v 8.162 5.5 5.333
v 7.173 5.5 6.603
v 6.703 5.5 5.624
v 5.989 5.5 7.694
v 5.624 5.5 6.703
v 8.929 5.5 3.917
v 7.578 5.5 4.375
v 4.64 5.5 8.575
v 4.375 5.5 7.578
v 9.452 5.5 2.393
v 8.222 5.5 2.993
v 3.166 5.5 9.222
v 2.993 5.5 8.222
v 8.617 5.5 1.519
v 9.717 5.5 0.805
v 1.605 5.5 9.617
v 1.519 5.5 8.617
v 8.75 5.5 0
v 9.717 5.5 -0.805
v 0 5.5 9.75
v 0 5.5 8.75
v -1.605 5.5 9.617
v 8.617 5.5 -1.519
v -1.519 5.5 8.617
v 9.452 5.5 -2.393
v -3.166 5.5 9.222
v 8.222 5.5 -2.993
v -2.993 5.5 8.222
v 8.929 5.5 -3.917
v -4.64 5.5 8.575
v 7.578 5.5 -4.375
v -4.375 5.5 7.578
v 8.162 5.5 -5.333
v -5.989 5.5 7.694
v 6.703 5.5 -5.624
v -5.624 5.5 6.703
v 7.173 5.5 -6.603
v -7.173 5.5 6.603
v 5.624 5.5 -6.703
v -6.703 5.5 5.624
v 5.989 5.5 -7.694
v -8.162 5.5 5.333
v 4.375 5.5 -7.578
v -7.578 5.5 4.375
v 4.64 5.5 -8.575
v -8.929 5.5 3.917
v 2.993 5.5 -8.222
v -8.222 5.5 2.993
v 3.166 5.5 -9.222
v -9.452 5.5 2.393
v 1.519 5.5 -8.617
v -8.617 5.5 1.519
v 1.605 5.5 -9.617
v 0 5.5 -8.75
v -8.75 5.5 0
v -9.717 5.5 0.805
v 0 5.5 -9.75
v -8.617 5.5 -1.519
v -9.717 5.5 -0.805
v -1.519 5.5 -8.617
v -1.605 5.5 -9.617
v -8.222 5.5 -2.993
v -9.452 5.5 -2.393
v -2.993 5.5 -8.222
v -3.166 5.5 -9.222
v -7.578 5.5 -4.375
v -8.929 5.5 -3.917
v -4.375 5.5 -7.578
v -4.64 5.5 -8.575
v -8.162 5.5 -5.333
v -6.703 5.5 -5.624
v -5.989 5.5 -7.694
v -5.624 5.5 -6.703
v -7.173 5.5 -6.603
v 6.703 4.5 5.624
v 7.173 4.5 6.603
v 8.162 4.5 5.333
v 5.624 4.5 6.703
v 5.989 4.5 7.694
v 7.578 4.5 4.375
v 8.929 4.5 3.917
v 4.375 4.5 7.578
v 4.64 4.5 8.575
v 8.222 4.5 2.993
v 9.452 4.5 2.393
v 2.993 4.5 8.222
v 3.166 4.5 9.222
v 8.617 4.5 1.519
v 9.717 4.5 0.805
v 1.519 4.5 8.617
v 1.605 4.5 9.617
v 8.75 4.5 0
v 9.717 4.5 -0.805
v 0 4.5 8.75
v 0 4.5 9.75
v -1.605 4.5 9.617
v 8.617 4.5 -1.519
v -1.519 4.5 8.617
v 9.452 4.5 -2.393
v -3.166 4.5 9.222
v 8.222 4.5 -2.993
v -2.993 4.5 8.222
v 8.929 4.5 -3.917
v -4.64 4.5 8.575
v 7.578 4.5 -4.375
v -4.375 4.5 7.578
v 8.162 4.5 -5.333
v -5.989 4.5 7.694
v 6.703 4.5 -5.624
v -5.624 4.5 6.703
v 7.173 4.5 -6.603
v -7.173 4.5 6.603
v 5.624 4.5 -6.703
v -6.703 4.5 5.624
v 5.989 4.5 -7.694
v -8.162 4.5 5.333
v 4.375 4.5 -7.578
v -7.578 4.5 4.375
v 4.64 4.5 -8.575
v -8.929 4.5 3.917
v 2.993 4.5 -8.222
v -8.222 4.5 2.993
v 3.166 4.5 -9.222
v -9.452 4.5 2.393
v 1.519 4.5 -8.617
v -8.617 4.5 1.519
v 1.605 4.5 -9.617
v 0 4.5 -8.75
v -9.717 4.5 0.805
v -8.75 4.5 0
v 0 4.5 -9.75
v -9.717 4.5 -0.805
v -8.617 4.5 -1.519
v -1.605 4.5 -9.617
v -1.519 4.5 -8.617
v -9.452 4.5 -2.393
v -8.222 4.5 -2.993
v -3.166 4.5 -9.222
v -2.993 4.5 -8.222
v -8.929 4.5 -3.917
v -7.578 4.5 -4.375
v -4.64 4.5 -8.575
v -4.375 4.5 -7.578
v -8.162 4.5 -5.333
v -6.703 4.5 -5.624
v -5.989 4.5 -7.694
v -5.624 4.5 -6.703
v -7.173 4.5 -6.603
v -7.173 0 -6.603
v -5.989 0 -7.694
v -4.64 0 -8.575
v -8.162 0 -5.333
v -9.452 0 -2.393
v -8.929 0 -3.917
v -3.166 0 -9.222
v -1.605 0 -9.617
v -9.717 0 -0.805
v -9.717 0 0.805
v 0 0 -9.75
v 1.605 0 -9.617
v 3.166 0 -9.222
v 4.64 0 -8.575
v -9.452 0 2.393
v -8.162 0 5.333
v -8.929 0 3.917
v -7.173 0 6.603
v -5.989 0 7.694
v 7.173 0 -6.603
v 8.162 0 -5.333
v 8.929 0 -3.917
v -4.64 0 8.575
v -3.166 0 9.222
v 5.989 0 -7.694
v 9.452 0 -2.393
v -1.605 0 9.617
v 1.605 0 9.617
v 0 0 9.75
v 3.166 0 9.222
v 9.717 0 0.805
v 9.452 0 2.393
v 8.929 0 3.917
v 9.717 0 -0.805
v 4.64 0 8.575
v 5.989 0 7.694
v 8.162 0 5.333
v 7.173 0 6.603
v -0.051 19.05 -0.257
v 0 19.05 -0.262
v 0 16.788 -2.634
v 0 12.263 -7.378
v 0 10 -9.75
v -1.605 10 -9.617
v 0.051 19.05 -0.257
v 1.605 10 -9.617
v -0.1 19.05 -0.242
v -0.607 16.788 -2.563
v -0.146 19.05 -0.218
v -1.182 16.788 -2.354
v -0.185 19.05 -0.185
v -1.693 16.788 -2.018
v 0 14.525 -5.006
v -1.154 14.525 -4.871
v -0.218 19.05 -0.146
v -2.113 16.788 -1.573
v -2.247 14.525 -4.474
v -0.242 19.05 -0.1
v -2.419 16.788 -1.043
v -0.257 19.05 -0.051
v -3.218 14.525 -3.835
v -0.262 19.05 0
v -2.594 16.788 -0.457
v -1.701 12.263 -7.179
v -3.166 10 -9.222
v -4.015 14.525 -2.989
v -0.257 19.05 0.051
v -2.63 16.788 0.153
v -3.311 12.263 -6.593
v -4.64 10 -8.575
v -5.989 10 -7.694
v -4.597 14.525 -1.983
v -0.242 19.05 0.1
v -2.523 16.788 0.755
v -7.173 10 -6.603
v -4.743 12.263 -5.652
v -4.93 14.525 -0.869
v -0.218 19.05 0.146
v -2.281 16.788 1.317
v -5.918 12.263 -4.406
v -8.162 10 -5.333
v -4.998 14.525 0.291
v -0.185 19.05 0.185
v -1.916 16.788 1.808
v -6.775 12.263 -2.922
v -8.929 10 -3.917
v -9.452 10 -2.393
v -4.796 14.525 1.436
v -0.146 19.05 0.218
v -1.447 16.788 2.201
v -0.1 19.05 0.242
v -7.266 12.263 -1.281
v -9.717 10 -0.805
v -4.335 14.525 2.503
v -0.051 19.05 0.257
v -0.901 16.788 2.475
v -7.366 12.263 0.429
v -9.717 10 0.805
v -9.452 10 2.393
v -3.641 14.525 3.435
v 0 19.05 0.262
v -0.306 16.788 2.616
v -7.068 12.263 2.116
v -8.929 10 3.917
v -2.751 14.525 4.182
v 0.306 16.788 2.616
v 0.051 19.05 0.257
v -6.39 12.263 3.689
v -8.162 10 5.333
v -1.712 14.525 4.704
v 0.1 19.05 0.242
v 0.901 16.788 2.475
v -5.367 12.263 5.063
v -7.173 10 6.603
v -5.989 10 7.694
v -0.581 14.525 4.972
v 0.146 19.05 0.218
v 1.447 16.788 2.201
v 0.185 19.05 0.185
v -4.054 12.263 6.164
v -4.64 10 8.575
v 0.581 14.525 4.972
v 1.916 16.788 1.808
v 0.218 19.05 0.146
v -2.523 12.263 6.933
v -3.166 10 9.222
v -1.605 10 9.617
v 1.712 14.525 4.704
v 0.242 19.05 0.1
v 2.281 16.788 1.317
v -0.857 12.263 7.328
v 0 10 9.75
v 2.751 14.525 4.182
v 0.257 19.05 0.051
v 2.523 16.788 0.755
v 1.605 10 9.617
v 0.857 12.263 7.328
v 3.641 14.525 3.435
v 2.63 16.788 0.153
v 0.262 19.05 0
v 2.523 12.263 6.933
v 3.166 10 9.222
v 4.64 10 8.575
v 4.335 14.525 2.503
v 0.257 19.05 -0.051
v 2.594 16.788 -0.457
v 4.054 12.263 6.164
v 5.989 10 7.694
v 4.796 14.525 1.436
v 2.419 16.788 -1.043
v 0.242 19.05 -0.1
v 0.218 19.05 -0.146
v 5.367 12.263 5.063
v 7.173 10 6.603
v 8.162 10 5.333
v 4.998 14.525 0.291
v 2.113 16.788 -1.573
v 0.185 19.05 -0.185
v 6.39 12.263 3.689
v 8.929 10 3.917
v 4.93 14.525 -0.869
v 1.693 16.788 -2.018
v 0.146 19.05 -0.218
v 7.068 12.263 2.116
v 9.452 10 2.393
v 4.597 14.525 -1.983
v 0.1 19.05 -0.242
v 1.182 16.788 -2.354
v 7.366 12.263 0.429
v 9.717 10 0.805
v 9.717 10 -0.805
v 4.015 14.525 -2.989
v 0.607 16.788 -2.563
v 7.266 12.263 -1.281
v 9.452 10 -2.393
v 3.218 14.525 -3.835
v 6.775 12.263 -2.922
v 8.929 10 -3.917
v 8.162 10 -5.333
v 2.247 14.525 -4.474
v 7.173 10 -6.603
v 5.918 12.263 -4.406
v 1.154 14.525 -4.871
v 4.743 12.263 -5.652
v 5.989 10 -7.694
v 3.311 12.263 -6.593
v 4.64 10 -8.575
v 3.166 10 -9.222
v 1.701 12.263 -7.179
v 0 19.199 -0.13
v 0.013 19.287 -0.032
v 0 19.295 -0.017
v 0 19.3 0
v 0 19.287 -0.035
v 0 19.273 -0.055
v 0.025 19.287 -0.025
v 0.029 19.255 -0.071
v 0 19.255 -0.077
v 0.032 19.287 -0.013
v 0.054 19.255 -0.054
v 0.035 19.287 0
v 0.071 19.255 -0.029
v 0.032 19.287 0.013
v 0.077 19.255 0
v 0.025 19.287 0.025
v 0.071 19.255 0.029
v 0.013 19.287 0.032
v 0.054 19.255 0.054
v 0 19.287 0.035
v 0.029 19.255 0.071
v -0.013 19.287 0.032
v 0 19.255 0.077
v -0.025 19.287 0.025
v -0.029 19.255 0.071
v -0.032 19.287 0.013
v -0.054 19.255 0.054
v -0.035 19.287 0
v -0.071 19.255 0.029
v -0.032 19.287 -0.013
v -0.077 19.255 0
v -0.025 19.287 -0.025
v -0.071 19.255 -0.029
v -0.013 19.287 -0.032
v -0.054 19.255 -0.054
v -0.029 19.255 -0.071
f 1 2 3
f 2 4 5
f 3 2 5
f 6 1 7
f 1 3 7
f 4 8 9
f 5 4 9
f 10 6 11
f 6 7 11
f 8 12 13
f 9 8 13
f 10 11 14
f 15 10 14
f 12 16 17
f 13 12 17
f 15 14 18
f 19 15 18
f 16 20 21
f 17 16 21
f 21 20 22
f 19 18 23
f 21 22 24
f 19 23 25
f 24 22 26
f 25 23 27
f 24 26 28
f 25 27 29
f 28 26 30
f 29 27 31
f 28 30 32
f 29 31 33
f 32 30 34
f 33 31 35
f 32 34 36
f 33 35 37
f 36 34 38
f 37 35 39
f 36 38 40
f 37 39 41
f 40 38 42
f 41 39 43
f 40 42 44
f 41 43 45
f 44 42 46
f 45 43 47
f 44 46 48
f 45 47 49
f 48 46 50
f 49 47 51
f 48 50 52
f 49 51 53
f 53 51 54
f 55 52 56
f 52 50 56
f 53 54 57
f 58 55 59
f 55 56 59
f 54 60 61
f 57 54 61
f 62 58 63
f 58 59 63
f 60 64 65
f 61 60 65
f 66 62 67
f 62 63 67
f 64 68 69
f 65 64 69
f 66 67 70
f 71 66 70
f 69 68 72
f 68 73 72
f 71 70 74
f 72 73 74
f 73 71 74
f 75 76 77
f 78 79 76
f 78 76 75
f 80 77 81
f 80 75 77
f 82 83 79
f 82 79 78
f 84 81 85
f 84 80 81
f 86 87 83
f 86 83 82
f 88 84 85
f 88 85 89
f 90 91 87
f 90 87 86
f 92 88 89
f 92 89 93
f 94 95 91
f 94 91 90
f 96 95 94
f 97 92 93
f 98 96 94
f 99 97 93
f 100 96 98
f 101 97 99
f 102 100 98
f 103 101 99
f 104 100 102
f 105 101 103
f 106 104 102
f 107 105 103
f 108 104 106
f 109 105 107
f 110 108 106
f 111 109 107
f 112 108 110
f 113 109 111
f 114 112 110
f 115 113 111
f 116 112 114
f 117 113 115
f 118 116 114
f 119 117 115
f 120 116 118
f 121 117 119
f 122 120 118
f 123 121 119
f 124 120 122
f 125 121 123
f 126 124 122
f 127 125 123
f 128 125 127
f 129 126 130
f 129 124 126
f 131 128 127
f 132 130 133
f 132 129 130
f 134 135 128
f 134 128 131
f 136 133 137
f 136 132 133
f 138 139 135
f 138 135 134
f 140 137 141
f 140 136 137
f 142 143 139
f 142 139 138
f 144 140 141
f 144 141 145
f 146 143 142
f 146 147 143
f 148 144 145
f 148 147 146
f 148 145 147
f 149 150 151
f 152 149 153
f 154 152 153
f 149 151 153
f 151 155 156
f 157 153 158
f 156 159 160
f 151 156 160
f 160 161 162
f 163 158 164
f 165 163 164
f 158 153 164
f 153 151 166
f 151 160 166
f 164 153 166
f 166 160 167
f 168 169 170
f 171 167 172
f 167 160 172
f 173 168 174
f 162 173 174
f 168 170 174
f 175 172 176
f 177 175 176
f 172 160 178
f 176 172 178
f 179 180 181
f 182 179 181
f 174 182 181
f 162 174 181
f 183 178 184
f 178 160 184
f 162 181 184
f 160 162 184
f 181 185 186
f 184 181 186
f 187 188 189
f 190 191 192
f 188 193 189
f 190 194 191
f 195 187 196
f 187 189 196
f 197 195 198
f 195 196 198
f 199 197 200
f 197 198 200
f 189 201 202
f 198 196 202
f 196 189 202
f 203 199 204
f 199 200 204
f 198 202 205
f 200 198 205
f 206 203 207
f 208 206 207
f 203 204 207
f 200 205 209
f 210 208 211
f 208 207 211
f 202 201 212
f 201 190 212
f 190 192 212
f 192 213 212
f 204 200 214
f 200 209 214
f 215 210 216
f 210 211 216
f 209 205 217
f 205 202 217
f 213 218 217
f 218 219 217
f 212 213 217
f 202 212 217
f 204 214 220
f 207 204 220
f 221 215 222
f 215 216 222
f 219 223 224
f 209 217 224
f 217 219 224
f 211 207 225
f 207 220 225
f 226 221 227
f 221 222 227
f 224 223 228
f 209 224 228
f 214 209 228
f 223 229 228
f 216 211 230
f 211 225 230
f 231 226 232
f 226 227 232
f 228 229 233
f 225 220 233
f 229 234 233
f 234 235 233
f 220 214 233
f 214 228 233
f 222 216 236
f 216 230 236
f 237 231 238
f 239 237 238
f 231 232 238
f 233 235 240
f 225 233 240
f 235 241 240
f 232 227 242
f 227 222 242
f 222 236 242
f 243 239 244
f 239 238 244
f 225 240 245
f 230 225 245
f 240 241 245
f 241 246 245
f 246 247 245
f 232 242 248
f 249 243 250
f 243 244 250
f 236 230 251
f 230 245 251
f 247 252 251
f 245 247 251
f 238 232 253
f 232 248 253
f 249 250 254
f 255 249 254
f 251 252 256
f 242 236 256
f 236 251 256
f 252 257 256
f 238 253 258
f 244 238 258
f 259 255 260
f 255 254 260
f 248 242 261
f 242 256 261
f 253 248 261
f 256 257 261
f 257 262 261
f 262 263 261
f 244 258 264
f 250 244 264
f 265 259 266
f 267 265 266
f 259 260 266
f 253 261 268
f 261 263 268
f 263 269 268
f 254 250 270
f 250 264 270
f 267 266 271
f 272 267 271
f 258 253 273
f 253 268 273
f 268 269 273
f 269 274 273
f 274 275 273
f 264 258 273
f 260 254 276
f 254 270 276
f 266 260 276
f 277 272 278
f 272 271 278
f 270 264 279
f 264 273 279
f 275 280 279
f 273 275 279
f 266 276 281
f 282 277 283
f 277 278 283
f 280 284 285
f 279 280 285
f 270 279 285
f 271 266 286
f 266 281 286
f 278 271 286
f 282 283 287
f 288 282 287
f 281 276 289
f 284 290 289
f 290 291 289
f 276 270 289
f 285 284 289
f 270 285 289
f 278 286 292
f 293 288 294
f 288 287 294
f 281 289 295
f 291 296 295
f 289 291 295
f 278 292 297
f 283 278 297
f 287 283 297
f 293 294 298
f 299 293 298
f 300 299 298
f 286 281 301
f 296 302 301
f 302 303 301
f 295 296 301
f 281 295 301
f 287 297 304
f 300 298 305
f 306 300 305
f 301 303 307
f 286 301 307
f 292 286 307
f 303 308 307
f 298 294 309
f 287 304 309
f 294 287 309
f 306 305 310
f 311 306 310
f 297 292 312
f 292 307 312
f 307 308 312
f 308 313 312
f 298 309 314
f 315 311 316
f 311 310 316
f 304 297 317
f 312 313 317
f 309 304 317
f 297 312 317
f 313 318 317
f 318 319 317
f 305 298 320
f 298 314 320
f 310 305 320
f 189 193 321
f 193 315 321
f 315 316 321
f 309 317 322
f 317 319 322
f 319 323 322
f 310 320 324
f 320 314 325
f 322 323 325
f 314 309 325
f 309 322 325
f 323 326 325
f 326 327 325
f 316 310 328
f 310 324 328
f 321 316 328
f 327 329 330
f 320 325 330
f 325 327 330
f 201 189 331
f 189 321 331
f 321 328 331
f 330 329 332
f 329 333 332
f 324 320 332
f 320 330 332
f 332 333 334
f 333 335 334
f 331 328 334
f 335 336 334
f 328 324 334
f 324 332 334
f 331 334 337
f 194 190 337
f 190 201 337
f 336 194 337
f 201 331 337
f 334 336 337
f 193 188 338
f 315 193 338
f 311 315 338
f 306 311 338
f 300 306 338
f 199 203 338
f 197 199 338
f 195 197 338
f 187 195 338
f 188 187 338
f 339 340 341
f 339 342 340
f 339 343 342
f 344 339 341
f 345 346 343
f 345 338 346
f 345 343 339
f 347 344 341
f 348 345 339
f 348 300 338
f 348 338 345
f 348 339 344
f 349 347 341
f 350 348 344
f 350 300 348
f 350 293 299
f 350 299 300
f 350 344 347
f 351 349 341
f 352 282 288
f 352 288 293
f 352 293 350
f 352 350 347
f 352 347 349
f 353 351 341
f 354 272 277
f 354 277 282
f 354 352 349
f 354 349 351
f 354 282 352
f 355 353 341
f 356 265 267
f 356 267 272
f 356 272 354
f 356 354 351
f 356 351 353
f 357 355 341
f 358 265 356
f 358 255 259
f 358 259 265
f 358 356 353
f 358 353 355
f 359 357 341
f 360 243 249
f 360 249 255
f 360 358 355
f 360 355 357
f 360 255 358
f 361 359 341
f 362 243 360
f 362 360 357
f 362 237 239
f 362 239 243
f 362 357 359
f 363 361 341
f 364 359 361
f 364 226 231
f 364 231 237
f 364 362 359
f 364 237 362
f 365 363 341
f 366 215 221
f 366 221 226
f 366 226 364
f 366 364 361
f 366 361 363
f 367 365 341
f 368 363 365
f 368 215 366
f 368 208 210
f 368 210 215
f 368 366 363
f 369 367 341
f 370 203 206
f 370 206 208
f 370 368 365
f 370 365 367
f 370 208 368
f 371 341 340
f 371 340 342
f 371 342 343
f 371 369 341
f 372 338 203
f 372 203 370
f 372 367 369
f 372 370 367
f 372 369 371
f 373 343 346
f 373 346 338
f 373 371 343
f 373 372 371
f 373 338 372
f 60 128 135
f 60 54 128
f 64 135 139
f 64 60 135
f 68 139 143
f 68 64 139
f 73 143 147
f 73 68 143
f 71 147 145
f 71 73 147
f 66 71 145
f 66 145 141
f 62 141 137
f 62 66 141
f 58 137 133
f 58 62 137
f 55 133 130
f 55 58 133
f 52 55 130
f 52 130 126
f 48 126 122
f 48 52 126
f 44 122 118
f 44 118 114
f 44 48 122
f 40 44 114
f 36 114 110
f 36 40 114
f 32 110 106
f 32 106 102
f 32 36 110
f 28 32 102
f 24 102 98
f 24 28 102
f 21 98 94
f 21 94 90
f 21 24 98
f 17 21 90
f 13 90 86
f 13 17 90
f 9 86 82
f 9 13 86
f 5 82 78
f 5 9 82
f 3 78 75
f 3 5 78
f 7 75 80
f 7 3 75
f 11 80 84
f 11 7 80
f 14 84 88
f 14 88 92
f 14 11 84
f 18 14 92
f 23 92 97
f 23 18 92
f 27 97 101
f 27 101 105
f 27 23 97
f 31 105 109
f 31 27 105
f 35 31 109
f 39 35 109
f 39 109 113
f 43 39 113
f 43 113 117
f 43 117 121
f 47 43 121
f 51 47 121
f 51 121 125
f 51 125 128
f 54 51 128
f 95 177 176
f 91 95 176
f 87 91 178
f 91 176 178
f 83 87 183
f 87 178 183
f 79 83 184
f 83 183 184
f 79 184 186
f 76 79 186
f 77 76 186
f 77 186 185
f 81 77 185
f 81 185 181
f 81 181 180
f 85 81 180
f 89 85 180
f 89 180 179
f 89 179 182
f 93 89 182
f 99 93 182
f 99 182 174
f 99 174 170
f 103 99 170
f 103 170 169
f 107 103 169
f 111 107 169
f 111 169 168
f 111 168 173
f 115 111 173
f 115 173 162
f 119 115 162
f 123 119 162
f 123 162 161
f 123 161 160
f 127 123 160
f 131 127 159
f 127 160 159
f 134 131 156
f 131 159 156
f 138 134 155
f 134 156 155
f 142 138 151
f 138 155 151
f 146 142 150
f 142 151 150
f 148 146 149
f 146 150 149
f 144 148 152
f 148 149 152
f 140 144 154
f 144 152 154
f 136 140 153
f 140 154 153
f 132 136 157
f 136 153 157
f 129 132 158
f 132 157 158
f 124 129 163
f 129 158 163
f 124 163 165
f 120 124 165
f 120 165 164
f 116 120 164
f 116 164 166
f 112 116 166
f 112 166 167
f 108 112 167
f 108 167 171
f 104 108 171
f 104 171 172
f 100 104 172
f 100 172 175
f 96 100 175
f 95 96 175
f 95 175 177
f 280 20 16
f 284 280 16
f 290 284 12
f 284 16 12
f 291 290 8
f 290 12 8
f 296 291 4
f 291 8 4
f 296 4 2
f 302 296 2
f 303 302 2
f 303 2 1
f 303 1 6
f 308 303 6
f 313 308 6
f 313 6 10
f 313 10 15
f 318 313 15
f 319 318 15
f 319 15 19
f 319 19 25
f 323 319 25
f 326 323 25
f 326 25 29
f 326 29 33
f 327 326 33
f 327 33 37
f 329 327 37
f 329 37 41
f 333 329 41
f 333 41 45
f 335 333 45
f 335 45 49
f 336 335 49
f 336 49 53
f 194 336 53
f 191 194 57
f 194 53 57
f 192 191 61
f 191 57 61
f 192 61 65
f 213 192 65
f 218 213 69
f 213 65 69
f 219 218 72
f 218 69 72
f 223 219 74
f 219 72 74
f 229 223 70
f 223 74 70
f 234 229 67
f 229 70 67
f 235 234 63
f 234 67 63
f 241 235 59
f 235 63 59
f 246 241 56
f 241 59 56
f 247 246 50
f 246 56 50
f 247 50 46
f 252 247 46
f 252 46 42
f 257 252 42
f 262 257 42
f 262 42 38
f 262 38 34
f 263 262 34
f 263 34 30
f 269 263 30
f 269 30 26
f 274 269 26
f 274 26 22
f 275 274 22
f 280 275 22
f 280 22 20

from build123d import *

# Parameters (mm, degrees)
SKETCH1_R           = 9.75
BOSS_EXTRUDE1_DEPTH = 10
SKETCH5_W           = 1
SKETCH5_H           = 1


with BuildPart() as part:
    # Sketch1 → Boss-Extrude1 (new body)
    with BuildSketch(Plane(origin=(0, 0, 0), x_dir=(1, 0, 0), z_dir=(0, 1, 0))):
        with Locations(Location((0, 0, 0), (0, 0, 270))):
            Circle(SKETCH1_R)
    extrude(amount=BOSS_EXTRUDE1_DEPTH)

    # Sketch2 → Revolve1 (revolve)
    with BuildSketch(Plane.XY, mode=Mode.PRIVATE) as revolve1_sk:
        Polygon((0, 10), (0, 19.300191168), (9.75, 10), align=None)
    revolve(revolve1_sk.sketch.rotate(Axis((0, 0, 0), (0, 1, 0)), 90), axis=Axis((0, 0, 0), (0, 1, 0)))

    # Sketch3 → Cut-Revolve1 (revolve, cut)
    with BuildSketch(Plane.XY, mode=Mode.PRIVATE) as cut_revolve1_sk:
        Polygon((0, 19.300191168), (0, 19.050191168), (0.262091387, 19.050191168), align=None)
    revolve(cut_revolve1_sk.sketch.rotate(Axis((0, 19.050191168, 0), (0, 1, 0)), 90), axis=Axis((0, 19.050191168, 0), (0, 1, 0)), mode=Mode.SUBTRACT)

    # Sketch4 → Revolve2 (revolve)
    with BuildSketch(Plane.XY, mode=Mode.PRIVATE) as revolve2_sk:
        with BuildLine():
            Line((0, 19.050191168), (0, 19.300191168))
            add(Edge.make_bspline(
                [(0, 19.300191168), (0.070360222, 19.286498468), (0.134000153, 19.189472435), (0.262091387, 19.050191168)],
                knots=[0.5, 0.5, 0.5, 0.5, 1, 1, 1, 1], degree=3))
            Line((0.262091387, 19.050191168), (0, 19.050191168))
        make_face()
    revolve(revolve2_sk.sketch.rotate(Axis((0, 19.050191168, 0), (0, -1, 0)), 270), axis=Axis((0, 19.050191168, 0), (0, -1, 0)))

    # Sketch5 → Cut-Revolve2 (revolve, cut)
    with BuildSketch(Plane.XY, mode=Mode.PRIVATE) as cut_revolve2_sk:
        with Locations((-9.25, 5)):
            Rectangle(SKETCH5_W, SKETCH5_H)
    revolve(cut_revolve2_sk.sketch.rotate(Axis((0, 0, 0), (0, 1, 0)), 270), axis=Axis((0, 0, 0), (0, 1, 0)), mode=Mode.SUBTRACT)


solid = part.part
